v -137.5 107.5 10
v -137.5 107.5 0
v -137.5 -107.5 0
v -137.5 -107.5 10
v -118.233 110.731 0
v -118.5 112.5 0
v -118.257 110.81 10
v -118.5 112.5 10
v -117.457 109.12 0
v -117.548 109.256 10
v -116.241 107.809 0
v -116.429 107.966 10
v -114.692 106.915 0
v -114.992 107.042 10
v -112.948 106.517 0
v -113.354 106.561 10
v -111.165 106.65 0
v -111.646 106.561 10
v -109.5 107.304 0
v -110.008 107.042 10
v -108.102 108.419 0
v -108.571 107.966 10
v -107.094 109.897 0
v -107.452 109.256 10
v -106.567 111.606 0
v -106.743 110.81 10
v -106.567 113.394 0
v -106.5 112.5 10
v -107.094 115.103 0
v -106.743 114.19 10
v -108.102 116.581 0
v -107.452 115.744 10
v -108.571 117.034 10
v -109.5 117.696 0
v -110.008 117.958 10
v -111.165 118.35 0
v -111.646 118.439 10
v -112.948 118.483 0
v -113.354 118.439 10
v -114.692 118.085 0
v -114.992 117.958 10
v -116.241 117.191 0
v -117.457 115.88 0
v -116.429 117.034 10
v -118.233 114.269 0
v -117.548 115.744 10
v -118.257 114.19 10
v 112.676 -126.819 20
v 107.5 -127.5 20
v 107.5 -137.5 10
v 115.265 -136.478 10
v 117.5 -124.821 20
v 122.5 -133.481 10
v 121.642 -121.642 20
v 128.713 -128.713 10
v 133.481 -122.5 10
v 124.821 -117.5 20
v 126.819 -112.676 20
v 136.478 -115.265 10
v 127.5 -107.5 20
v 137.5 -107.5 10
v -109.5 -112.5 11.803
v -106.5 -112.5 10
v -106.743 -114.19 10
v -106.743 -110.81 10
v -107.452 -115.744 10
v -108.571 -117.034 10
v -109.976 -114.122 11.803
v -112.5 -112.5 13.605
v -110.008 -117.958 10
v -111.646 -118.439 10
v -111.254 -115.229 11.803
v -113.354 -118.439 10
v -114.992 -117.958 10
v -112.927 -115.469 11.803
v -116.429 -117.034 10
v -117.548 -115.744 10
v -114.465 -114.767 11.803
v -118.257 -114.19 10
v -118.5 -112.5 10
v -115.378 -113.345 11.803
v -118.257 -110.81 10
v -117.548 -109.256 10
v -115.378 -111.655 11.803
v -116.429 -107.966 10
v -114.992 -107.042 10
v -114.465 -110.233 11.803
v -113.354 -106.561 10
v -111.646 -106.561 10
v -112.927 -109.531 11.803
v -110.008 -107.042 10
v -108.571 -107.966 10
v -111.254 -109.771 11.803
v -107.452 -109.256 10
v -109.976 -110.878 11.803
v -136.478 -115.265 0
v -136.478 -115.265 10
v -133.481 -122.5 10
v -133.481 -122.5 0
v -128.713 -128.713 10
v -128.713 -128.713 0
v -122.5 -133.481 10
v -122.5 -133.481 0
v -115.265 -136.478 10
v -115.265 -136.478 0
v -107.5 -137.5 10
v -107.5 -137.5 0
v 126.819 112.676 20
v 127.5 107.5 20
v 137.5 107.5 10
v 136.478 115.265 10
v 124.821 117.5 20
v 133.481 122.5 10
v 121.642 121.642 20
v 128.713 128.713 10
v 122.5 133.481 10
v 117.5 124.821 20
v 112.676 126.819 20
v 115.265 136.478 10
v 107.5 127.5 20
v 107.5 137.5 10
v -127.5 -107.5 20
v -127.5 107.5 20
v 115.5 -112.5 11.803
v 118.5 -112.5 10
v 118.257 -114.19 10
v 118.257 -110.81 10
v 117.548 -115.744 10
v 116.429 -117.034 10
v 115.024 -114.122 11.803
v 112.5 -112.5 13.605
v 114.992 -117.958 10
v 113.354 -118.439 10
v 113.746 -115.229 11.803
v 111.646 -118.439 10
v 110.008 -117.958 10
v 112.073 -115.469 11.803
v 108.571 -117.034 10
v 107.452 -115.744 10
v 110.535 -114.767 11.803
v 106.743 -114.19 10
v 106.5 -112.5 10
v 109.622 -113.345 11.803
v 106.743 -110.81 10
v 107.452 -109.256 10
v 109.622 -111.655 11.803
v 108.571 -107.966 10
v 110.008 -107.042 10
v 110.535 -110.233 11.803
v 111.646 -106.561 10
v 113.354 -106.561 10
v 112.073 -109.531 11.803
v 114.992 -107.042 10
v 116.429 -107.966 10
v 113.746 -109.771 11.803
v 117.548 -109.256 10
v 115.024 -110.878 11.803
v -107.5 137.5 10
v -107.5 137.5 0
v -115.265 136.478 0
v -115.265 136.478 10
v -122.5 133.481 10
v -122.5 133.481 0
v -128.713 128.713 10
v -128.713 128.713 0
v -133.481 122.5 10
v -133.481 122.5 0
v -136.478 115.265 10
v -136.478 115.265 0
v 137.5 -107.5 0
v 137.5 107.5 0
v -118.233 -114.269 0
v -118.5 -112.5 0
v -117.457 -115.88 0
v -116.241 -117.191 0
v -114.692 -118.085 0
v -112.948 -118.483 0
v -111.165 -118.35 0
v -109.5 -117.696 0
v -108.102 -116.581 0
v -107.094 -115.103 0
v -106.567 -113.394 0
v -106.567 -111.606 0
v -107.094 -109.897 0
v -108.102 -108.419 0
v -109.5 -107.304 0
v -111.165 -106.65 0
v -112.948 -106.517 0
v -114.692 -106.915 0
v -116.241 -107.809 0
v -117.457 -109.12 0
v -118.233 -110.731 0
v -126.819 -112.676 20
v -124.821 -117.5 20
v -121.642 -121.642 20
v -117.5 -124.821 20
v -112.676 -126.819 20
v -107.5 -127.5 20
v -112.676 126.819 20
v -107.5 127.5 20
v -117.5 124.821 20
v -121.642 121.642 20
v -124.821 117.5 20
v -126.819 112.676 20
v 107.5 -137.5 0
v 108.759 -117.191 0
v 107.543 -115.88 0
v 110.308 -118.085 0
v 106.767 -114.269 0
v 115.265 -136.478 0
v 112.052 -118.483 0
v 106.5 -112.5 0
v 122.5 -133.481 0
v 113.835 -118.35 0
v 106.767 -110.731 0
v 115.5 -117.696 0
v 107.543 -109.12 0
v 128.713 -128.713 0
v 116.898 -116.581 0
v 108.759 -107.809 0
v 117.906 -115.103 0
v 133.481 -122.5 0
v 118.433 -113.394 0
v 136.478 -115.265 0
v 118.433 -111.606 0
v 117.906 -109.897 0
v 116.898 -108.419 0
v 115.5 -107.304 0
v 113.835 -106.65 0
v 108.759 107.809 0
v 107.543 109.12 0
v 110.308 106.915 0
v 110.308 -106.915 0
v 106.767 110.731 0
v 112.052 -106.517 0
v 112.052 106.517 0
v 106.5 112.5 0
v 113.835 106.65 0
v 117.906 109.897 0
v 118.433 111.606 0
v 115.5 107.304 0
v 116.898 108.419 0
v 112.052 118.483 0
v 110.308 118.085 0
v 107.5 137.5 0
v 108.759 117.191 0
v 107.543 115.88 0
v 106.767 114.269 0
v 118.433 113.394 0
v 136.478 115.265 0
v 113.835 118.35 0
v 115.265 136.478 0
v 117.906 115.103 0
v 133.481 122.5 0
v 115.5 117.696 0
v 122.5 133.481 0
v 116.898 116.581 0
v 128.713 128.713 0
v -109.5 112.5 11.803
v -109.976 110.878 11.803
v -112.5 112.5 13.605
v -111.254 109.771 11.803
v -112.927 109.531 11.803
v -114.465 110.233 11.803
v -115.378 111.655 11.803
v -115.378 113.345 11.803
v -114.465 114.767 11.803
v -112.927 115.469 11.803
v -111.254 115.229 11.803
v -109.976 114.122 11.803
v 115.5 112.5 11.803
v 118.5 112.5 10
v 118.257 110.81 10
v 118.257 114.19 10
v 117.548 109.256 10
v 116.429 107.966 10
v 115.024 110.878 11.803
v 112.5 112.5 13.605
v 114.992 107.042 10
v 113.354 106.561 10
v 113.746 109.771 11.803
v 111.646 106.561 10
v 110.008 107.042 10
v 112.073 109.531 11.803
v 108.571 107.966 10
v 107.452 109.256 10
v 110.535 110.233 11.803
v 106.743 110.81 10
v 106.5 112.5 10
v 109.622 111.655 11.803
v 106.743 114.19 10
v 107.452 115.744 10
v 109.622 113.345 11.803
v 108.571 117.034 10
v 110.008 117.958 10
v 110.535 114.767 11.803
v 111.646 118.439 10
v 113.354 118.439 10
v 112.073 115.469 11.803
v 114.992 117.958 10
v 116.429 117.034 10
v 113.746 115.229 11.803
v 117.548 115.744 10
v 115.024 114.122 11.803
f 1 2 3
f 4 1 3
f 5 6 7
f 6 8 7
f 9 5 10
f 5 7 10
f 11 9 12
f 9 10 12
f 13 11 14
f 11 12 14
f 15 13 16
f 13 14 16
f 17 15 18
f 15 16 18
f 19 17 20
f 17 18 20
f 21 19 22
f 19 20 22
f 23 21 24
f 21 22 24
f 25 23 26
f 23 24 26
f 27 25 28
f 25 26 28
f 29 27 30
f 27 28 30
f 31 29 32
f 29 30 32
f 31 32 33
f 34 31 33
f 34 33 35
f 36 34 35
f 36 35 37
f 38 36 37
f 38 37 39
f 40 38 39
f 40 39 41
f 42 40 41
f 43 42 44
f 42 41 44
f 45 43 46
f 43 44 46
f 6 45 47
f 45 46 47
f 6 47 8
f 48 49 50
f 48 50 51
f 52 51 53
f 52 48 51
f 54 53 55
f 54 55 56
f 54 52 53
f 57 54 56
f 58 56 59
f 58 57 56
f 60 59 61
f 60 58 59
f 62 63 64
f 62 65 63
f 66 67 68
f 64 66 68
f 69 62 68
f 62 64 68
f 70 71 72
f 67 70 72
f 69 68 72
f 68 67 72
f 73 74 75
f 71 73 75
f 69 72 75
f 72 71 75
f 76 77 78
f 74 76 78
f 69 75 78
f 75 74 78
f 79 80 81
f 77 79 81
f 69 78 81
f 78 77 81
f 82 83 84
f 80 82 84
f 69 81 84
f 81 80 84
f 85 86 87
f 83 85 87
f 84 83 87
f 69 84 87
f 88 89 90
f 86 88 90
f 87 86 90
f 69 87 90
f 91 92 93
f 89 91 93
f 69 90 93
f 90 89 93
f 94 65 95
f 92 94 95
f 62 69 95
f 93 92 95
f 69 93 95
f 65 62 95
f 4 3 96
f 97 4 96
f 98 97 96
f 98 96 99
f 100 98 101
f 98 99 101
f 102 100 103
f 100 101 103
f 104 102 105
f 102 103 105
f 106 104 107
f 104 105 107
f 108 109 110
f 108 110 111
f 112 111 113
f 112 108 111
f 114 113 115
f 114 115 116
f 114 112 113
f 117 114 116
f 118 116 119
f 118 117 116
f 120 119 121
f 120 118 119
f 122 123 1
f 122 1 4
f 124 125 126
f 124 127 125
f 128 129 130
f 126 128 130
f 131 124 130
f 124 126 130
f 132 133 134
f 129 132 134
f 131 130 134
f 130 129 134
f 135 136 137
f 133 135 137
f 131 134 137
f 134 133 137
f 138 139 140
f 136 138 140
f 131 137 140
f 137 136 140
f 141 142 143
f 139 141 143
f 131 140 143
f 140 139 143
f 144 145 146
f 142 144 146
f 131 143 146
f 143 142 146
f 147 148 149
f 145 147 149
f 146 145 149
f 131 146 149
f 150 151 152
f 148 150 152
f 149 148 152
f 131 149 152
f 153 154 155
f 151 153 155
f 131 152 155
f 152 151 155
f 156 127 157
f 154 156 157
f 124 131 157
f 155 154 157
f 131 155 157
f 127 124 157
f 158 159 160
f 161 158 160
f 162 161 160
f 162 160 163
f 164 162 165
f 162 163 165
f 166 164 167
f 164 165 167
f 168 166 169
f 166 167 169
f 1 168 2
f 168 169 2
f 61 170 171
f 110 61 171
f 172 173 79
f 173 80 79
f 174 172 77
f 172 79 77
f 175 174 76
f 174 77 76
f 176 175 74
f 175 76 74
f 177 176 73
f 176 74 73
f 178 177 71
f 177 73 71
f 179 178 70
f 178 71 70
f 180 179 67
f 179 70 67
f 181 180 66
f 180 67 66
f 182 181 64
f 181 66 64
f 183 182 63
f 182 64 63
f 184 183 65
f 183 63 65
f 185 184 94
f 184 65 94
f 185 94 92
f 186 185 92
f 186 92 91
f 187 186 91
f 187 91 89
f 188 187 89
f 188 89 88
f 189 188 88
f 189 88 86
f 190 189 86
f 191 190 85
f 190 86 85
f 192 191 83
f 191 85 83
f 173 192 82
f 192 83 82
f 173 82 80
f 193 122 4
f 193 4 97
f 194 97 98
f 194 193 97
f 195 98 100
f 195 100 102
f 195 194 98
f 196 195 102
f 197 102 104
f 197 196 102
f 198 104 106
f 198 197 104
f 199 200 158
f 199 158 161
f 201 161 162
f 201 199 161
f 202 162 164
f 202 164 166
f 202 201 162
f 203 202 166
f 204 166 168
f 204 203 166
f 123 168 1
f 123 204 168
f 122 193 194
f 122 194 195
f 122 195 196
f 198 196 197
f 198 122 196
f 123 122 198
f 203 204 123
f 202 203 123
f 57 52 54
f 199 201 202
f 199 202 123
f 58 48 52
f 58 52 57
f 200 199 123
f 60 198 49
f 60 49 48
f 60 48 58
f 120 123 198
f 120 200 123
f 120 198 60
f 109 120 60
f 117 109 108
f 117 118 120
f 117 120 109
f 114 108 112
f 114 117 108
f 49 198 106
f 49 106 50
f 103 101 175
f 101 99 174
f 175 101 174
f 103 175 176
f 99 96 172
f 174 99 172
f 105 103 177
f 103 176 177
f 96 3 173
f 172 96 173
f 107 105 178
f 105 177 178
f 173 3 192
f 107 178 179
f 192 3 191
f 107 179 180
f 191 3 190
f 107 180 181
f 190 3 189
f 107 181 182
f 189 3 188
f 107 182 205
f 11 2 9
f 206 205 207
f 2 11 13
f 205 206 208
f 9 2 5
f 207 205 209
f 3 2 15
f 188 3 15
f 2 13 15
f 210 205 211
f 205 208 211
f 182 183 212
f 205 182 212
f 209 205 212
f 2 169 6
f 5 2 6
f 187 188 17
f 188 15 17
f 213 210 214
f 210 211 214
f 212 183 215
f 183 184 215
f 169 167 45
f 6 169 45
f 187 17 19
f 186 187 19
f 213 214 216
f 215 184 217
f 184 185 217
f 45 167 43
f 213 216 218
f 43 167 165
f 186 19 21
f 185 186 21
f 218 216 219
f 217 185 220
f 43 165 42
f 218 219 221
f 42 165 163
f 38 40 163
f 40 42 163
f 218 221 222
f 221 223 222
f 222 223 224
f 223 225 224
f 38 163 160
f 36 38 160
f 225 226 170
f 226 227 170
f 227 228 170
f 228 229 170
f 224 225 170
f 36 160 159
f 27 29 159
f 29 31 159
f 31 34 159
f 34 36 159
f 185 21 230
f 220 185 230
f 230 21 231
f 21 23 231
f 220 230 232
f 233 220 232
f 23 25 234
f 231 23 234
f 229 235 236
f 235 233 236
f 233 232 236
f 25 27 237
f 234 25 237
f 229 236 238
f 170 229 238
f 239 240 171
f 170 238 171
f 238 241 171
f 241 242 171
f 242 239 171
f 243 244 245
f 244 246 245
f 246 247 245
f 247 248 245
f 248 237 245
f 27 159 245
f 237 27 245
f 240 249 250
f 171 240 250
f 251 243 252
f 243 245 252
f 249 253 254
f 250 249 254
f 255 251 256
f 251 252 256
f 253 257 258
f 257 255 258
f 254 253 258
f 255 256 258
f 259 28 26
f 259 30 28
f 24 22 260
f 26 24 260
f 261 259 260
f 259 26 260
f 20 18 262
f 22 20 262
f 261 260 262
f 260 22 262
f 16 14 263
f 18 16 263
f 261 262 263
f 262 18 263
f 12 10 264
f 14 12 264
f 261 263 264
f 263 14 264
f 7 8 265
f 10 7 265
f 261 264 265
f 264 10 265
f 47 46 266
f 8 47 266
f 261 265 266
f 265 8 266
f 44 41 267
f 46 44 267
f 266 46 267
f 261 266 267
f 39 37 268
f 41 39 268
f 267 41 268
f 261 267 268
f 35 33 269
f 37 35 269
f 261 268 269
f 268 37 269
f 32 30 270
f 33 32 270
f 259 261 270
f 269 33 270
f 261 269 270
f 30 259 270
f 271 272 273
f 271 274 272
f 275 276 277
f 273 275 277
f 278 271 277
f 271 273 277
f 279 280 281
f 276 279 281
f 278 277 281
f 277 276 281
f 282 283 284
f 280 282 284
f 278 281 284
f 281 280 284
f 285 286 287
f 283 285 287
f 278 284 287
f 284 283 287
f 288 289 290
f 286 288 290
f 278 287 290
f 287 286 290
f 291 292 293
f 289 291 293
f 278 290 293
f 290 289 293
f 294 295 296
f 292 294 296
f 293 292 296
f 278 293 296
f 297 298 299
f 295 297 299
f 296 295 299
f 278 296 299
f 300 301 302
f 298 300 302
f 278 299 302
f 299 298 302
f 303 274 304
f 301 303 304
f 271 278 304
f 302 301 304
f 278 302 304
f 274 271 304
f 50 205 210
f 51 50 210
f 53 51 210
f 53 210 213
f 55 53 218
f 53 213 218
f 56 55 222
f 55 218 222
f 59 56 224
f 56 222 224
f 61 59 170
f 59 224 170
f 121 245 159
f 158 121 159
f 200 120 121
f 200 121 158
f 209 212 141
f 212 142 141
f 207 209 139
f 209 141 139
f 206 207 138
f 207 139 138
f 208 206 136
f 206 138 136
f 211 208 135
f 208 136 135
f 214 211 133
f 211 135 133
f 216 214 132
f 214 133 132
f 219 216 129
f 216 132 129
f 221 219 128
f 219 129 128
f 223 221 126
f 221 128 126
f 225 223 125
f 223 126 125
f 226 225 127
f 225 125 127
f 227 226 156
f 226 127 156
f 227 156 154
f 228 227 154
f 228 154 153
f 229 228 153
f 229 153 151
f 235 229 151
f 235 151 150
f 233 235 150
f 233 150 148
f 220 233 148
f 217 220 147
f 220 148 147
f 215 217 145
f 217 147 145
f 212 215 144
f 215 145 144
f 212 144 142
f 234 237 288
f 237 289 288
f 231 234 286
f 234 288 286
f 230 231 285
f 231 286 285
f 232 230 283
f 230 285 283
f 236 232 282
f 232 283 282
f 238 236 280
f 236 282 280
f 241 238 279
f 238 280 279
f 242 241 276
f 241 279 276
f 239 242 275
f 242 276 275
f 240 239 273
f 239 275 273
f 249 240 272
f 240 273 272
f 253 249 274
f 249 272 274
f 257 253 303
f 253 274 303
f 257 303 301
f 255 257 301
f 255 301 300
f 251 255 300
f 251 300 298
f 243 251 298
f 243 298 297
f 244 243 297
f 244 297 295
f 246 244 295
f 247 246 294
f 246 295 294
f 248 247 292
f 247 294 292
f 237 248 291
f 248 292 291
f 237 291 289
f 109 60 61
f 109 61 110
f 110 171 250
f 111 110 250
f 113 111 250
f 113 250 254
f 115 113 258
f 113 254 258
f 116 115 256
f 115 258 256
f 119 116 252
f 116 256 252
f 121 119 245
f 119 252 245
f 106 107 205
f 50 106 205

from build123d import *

# Parameters (mm, degrees)
F1_DEPTH = 20
F2_SIZE  = 10
F4_D     = 12
F4_DEPTH = 10
F4_TIP   = 3.6051637142


with BuildPart() as f1:
    # F0 (on Top) → F1 (new body)
    with BuildSketch(Plane.XY):
        with BuildLine():
            Line((107.5, 137.5), (-107.5, 137.5))
            ThreePointArc((-107.5, 137.5), (-128.7132034356, 128.7132034356), (-137.5, 107.5))
            Line((-137.5, 107.5), (-137.5, -107.5))
            ThreePointArc((-137.5, -107.5), (-128.7132034356, -128.7132034356), (-107.5, -137.5))
            Line((-107.5, -137.5), (107.5, -137.5))
            ThreePointArc((107.5, -137.5), (128.7132034356, -128.7132034356), (137.5, -107.5))
            Line((137.5, -107.5), (137.5, 107.5))
            ThreePointArc((137.5, 107.5), (128.7132034356, 128.7132034356), (107.5, 137.5))
        make_face()
    extrude(amount=F1_DEPTH)

    # F2
    f2_edges = [f1.edges().sort_by_distance(p)[0] for p in [
        (-137.5, 0, 20),
    ]]
    chamfer(f2_edges, length=F2_SIZE)

    # F4
    with Locations(Plane(origin=(0, 0, 0), x_dir=(1, 0, 0), z_dir=(0, 0, -1))):
        with Locations((-112.5, 112.5), (112.5, 112.5), (112.5, -112.5), (-112.5, -112.5)):
            Hole(F4_D / 2, depth=F4_DEPTH)
            with Locations((0, 0, -(F4_DEPTH + F4_TIP / 2))):  # 118° drill point
                Cone(0, F4_D / 2, F4_TIP, mode=Mode.SUBTRACT)


solid = f1.part
